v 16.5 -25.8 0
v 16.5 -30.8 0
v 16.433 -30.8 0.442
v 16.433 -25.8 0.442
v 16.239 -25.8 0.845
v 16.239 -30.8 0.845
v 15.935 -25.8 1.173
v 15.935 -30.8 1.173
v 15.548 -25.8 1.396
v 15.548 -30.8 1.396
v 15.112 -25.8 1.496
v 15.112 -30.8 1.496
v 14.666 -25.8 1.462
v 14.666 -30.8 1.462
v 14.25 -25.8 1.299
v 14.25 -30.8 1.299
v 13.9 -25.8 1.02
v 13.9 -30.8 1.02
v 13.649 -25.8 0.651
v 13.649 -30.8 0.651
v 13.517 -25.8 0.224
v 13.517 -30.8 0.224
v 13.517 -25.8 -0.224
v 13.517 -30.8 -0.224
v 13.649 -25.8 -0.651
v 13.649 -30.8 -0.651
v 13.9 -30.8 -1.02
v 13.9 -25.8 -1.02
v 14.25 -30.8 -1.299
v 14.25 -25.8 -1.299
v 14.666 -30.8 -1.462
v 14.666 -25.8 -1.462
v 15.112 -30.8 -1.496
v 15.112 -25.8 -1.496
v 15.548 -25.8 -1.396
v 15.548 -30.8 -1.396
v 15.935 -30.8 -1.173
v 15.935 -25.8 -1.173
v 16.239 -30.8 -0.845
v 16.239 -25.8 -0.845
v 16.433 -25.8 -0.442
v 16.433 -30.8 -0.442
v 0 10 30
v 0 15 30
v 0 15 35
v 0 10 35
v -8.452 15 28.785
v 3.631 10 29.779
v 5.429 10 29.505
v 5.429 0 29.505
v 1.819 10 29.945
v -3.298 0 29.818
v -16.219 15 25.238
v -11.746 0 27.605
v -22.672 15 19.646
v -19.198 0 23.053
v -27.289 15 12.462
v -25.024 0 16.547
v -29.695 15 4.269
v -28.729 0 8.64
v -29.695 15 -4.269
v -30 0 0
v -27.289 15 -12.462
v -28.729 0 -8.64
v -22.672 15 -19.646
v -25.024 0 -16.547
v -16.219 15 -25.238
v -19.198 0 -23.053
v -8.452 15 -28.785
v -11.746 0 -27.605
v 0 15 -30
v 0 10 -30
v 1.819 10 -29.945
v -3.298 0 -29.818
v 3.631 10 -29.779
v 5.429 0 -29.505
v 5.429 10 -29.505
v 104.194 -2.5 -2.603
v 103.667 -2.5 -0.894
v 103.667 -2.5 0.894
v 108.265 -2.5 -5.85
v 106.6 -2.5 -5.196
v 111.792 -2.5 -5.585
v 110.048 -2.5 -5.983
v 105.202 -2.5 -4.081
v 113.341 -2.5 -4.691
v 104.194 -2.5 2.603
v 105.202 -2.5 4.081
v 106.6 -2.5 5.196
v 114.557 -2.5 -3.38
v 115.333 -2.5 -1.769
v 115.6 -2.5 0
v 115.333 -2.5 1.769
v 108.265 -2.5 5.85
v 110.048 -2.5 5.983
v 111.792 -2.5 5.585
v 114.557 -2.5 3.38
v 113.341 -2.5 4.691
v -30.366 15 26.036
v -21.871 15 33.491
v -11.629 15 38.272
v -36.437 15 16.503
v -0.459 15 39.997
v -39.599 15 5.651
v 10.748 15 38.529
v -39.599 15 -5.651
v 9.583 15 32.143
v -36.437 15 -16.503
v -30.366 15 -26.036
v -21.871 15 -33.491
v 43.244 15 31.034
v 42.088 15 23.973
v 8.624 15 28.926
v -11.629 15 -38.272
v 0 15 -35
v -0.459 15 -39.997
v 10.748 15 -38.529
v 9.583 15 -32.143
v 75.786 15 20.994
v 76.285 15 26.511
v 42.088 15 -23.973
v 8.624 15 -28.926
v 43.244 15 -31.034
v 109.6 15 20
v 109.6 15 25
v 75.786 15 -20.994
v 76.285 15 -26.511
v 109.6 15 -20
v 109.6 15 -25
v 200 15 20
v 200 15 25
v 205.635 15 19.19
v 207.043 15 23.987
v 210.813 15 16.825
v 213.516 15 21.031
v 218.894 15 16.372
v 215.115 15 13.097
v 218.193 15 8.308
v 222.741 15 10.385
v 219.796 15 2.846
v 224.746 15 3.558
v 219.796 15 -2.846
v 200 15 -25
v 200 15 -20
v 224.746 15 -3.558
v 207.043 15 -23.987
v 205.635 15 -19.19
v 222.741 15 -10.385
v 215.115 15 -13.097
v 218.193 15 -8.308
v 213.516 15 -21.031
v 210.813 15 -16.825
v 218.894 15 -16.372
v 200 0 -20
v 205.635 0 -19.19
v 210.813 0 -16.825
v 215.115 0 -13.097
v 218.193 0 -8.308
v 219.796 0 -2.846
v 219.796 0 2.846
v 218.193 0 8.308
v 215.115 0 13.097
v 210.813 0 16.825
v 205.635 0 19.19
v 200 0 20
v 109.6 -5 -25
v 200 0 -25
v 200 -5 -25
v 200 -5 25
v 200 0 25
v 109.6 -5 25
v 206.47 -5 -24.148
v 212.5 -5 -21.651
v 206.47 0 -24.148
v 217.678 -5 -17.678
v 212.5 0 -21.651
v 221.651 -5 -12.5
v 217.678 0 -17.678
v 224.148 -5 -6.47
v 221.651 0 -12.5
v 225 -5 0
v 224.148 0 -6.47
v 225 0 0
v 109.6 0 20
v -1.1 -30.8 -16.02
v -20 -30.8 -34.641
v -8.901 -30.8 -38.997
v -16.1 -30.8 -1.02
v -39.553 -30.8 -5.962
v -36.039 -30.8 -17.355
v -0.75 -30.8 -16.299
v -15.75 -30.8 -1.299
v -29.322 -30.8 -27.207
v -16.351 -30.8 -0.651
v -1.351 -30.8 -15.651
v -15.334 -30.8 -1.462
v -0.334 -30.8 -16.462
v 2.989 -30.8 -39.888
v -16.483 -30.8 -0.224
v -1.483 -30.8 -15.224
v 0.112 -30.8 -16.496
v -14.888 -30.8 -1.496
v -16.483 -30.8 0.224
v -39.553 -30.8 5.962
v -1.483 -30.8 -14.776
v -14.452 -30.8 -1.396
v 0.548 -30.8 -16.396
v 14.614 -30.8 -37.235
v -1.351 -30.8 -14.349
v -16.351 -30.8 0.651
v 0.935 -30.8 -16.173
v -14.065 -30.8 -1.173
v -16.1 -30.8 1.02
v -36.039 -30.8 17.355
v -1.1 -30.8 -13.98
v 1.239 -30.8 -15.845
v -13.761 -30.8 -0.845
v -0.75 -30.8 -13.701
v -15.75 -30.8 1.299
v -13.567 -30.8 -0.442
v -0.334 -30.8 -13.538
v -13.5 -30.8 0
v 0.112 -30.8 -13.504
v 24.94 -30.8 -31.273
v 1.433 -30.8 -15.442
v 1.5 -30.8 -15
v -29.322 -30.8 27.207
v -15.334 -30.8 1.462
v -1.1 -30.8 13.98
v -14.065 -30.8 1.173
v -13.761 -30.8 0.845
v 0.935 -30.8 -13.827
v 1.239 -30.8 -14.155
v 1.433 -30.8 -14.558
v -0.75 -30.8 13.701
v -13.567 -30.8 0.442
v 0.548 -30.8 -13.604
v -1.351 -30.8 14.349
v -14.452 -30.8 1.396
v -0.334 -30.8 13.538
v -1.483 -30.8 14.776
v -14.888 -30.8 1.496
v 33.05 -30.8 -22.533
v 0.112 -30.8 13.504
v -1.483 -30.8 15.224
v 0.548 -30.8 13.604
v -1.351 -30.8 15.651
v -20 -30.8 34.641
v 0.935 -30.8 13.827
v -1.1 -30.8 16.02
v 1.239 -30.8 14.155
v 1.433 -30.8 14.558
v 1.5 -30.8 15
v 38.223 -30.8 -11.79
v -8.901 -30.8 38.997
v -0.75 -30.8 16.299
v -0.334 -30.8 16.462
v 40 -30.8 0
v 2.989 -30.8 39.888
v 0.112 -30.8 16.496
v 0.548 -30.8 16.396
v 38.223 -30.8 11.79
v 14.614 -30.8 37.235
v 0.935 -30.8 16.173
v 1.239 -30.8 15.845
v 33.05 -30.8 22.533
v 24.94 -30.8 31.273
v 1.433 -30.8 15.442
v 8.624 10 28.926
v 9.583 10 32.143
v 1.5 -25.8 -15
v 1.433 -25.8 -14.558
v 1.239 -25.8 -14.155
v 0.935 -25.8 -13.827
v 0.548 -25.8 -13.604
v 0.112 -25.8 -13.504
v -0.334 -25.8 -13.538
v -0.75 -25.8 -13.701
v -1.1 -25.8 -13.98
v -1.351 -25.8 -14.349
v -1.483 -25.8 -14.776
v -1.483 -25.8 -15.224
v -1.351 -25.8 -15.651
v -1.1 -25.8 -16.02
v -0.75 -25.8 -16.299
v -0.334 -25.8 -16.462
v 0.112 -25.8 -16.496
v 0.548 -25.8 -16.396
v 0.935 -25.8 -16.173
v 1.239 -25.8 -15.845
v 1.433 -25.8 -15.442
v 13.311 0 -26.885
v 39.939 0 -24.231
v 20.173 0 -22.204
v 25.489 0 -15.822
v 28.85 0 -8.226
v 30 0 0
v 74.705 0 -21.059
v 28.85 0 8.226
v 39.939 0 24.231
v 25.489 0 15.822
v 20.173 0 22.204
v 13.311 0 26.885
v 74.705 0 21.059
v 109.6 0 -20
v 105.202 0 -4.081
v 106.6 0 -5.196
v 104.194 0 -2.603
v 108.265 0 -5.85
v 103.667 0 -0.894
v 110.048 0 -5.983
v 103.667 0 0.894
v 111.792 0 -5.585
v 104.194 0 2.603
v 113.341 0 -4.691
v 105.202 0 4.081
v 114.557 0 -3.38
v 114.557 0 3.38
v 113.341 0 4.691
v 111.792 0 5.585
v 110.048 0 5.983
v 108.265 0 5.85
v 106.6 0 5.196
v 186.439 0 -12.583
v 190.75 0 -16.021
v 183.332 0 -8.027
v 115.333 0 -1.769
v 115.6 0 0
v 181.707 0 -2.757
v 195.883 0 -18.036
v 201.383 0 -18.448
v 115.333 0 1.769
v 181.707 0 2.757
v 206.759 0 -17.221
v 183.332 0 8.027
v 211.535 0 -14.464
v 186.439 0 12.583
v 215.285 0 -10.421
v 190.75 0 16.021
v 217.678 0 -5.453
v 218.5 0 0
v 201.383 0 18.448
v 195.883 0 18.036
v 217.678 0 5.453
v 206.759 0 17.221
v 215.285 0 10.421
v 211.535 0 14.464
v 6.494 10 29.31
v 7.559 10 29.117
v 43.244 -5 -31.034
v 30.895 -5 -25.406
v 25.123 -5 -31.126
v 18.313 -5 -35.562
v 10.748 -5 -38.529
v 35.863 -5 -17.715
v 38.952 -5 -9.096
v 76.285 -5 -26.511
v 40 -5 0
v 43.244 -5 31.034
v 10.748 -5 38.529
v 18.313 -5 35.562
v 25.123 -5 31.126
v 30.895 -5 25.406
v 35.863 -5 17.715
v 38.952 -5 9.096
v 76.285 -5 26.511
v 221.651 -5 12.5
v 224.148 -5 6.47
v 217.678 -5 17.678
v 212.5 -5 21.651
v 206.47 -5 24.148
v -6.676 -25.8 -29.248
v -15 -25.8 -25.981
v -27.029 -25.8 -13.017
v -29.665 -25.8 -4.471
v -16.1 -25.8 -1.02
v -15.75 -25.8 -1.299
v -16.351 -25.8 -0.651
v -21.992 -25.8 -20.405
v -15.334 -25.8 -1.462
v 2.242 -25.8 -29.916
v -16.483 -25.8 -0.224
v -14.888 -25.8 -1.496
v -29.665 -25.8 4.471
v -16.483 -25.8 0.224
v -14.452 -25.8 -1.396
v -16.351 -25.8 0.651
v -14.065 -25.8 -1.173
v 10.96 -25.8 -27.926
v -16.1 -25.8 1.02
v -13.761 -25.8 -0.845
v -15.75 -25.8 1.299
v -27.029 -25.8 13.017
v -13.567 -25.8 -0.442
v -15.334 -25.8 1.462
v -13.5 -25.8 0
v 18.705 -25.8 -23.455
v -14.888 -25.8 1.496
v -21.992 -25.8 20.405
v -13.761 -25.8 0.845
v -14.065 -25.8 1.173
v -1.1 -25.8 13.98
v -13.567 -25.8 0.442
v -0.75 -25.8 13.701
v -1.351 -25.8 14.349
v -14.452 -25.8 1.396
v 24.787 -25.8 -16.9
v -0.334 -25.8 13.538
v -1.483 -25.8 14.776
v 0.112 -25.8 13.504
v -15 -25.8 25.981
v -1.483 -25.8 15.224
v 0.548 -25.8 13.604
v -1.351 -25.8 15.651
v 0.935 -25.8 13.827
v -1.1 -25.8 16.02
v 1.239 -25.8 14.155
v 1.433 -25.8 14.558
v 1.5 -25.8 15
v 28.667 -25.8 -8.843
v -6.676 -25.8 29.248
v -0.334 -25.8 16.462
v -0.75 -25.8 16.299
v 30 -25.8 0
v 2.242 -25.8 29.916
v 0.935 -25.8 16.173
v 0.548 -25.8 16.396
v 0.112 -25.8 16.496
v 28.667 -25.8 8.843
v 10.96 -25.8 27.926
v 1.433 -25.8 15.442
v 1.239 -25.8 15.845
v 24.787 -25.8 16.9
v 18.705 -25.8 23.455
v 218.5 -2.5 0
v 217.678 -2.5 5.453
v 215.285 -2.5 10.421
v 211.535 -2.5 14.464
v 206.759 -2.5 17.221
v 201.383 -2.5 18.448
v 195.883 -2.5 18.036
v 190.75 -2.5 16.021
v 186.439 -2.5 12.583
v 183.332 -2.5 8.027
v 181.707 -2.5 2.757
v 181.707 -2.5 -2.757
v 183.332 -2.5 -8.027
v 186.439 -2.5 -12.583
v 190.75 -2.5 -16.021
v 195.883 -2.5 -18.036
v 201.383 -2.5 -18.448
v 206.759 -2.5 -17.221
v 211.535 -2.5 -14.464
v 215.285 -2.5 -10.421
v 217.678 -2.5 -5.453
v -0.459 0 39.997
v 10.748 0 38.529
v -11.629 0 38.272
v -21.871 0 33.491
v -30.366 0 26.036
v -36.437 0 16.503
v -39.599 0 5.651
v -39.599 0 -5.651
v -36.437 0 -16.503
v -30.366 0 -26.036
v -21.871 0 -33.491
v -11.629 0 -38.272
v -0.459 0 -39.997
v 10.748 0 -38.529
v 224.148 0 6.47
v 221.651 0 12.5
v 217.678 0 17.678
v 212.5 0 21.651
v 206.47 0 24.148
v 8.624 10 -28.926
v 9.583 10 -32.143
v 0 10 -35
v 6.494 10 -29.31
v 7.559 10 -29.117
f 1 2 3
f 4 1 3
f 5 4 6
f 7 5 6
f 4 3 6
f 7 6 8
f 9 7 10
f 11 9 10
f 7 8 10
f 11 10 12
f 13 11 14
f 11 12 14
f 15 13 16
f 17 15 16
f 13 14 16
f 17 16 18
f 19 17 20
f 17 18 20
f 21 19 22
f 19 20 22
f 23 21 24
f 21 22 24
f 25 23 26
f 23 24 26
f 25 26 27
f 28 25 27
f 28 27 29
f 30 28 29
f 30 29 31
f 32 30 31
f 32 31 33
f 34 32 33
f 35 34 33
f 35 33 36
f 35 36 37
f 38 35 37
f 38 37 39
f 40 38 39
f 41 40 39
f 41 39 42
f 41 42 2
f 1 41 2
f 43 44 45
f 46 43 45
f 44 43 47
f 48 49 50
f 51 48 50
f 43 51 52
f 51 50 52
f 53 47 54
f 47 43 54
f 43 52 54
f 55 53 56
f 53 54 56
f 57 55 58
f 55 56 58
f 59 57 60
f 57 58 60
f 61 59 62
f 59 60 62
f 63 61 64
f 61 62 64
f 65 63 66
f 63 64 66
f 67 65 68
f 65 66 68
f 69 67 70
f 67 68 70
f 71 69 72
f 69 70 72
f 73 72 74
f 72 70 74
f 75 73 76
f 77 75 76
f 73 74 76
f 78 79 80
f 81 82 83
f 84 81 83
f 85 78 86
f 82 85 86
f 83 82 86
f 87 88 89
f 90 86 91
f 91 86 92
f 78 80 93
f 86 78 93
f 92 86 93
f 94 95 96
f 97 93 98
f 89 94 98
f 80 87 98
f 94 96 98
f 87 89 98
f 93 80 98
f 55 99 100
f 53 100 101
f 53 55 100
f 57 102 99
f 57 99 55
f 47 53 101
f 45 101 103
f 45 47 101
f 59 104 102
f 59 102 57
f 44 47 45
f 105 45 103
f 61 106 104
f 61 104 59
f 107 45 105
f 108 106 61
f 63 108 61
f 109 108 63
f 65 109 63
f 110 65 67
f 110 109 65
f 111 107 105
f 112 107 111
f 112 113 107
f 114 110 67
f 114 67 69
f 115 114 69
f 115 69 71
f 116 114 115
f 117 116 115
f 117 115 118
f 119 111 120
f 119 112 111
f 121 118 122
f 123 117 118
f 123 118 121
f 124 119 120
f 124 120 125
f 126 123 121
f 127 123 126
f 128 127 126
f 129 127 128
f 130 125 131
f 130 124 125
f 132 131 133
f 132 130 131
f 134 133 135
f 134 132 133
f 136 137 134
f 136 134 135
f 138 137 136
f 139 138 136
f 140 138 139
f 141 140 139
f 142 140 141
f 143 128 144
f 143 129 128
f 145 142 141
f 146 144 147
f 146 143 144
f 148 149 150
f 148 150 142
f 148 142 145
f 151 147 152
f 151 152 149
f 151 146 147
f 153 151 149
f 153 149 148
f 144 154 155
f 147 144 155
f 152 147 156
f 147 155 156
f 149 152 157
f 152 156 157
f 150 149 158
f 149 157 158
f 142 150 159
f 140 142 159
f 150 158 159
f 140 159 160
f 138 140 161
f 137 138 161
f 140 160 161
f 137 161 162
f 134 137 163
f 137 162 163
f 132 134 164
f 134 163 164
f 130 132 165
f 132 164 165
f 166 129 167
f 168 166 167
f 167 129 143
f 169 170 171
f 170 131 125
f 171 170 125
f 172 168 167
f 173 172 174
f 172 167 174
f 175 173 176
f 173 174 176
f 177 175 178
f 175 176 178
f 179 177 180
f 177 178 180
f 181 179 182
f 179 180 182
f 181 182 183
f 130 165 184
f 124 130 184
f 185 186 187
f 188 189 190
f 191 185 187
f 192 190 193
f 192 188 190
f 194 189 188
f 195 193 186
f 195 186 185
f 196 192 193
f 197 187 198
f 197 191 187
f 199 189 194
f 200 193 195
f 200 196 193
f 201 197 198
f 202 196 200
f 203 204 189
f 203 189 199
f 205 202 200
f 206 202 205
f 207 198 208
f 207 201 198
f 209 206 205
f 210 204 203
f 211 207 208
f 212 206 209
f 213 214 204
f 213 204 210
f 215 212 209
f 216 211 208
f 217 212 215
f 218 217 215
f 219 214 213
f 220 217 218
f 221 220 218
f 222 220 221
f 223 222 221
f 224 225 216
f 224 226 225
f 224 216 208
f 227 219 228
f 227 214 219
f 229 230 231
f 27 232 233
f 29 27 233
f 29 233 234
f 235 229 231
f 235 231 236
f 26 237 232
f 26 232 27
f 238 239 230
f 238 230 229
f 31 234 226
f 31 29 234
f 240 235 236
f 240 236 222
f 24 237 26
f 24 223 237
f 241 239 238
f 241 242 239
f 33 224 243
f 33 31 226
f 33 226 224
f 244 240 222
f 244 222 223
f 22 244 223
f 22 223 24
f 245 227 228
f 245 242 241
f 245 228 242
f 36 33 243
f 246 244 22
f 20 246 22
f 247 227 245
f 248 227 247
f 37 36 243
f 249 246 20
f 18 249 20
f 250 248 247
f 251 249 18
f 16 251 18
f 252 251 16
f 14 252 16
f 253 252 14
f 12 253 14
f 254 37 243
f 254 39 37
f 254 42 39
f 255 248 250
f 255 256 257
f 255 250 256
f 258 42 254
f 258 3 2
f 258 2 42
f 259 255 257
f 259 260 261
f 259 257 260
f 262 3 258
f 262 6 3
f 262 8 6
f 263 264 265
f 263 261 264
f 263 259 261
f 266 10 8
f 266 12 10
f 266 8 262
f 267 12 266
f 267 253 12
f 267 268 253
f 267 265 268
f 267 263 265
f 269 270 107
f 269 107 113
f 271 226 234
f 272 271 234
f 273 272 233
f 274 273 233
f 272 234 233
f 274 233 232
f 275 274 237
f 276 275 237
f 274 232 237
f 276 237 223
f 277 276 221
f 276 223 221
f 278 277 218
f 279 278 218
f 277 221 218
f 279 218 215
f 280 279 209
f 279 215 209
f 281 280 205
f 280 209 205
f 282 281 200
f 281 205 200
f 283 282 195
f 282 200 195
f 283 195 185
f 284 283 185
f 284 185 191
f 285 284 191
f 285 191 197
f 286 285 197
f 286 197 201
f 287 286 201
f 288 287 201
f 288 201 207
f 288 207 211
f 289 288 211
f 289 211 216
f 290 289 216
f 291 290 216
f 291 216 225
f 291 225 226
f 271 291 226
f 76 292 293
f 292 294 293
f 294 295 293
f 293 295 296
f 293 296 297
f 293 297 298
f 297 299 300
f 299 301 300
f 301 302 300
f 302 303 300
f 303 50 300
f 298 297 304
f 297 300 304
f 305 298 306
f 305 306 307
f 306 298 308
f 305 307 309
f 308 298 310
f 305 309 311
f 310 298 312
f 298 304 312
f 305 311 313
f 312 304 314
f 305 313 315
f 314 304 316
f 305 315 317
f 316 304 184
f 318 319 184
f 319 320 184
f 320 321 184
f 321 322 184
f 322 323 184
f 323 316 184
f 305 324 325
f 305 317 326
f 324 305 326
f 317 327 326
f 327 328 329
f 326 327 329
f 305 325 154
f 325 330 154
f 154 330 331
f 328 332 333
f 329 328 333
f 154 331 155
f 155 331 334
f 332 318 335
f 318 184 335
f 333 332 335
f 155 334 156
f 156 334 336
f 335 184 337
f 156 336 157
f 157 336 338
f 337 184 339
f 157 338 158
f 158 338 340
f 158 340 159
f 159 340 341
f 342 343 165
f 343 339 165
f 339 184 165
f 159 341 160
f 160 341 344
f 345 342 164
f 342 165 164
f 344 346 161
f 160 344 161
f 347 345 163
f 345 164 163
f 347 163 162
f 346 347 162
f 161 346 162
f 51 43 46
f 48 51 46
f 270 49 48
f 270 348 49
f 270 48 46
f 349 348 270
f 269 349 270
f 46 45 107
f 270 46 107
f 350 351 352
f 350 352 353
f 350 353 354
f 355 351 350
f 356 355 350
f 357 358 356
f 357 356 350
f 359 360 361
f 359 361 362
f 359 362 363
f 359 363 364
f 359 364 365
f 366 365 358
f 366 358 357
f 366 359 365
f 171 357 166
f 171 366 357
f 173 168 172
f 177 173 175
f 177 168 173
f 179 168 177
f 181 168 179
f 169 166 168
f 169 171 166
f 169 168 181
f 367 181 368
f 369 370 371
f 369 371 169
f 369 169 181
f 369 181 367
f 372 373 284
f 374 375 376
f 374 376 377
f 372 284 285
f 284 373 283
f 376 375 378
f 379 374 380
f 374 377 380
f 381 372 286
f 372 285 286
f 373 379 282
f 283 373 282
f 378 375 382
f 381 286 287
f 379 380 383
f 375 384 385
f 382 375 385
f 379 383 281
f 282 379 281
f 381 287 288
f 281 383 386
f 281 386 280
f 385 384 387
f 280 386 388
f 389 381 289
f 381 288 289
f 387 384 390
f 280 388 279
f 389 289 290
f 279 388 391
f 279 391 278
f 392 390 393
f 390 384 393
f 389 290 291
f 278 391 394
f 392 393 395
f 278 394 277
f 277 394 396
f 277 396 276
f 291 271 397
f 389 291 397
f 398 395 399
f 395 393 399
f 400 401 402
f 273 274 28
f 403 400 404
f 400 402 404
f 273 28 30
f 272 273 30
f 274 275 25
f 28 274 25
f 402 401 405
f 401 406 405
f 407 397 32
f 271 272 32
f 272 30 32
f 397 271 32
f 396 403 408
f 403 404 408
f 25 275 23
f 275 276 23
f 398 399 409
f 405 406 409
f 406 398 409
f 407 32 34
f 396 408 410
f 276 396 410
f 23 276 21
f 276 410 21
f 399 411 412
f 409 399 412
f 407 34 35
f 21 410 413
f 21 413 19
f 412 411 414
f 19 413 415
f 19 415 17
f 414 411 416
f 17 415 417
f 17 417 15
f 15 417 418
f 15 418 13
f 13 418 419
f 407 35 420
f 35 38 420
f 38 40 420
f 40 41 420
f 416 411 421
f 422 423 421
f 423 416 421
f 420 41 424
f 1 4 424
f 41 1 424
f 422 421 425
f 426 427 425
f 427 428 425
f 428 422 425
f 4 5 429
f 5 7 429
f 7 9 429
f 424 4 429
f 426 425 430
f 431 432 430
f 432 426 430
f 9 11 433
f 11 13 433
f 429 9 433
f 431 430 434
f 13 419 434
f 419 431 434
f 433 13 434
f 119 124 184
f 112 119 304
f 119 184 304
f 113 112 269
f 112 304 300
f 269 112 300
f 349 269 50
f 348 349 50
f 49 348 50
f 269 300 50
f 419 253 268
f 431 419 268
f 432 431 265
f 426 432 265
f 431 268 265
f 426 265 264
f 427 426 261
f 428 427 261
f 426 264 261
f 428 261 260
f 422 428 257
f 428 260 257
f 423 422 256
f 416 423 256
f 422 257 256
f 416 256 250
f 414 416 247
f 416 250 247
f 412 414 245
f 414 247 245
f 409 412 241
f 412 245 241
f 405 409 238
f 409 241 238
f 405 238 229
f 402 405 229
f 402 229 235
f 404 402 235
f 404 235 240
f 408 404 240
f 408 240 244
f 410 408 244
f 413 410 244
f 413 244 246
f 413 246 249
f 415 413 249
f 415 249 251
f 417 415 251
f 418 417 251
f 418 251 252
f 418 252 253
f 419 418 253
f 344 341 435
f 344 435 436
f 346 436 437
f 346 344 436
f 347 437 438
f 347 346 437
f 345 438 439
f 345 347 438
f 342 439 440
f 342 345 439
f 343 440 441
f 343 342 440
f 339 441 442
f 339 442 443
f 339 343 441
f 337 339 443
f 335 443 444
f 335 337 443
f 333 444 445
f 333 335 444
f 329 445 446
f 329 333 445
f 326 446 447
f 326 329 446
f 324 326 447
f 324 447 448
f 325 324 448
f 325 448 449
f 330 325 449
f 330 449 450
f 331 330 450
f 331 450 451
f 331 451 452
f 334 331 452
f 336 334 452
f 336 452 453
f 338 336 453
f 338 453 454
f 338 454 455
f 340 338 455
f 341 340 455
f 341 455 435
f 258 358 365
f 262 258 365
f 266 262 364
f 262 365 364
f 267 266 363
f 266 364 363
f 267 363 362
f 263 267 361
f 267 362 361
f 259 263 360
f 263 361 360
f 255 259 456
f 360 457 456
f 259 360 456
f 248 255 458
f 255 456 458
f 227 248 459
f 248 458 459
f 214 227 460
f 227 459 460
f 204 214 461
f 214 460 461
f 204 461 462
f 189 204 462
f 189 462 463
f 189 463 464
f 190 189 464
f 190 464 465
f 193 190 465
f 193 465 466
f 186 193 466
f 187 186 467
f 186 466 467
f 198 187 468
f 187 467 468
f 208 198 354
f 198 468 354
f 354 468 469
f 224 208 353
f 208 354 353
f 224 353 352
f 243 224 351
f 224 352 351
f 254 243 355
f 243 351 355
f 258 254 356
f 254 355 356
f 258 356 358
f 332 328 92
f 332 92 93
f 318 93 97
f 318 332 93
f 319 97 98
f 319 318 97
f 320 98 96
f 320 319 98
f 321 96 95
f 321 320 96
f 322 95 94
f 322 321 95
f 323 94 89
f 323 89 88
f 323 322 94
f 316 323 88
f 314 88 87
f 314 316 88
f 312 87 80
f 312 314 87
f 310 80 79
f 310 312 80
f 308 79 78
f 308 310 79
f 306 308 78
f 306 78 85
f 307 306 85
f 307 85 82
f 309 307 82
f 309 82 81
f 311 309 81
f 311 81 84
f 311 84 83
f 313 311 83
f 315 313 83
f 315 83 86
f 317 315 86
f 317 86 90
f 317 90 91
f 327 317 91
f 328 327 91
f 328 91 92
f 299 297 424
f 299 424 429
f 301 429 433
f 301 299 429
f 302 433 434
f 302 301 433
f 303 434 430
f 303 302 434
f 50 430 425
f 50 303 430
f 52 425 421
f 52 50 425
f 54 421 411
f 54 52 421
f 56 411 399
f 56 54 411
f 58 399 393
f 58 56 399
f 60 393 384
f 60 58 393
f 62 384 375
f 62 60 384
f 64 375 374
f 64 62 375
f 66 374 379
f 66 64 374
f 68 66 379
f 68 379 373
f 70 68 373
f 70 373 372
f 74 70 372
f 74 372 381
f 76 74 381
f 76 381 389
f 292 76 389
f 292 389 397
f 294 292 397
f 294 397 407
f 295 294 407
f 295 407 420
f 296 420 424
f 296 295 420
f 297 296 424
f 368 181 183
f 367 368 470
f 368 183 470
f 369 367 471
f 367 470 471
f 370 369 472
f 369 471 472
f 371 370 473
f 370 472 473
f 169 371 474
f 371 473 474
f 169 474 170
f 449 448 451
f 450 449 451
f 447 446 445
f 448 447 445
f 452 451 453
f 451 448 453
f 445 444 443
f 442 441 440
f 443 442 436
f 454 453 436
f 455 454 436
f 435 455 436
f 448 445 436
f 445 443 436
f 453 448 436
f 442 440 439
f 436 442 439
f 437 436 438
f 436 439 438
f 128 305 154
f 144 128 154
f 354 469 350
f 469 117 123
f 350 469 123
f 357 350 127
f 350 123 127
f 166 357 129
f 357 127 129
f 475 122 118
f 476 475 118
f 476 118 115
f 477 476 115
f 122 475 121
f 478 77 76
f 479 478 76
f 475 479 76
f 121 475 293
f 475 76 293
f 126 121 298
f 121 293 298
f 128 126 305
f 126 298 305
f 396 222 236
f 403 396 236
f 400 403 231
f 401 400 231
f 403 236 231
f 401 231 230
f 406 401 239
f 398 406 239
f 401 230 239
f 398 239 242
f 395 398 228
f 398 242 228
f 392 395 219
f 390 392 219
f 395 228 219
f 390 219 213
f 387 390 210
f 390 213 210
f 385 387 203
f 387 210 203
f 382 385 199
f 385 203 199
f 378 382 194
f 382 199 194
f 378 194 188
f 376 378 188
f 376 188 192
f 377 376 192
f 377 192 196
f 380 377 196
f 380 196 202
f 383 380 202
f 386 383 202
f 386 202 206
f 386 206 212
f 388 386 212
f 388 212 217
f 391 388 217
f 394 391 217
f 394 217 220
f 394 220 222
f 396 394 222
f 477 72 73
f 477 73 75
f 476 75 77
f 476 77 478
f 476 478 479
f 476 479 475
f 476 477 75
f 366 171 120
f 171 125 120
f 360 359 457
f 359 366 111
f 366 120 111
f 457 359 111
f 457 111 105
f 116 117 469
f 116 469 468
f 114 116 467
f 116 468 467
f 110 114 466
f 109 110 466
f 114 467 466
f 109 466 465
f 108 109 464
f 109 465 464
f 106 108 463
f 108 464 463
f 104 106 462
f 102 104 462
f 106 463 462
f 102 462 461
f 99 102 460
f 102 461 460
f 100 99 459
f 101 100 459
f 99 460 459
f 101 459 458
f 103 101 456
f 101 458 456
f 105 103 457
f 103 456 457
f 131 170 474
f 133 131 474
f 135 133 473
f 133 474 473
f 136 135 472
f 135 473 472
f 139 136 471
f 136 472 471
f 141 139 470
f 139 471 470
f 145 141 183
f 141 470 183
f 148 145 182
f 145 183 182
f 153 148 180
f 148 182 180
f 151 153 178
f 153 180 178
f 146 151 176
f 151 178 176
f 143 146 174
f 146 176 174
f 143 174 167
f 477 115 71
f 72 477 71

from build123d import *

# Parameters (mm, degrees)
BOSS_EXTRUDE1_DEPTH     = 15
SKETCH2_R               = 40
SKETCH2_R_2             = 30
BOSS_EXTRUDE2_DEPTH     = 25.8
SKETCH3_R               = 40
BOSS_EXTRUDE3_DEPTH     = 5
SKETCH4_R               = 6
SKETCH4_R_2             = 18.5
BOSS_EXTRUDE4_DEPTH     = 5
SKETCH6_R               = 6
SKETCH6_R_2             = 18.5
BOSS_EXTRUDE5_DEPTH     = 2.5
CUT_EXTRUDE1_DEPTH      = 5
SKETCH8_R               = 1.5
CUT_EXTRUDE2_DEPTH      = 1
CUT_EXTRUDE2_DEPTH_BACK = 46.8


with BuildPart() as part:
    # Sketch1 → Boss-Extrude1 (new body)
    with BuildSketch(Plane(origin=(0, 0, 0), x_dir=(1, 0, 0), z_dir=(0, 1, 0))):
        with BuildLine():
            ThreePointArc((200, -25), (225, 0), (200, 25))
            Line((200, 25), (109.6, 25))
            ThreePointArc((109.6, 25), (59.713041879, 28.397959328), (10.747591761, 38.529070471))
            ThreePointArc((10.747591761, 38.529070471), (-40, 0), (10.747591761, -38.529070471))
            ThreePointArc((10.747591761, -38.529070471), (59.713041879, -28.397959328), (109.6, -25))
            Line((109.6, -25), (200, -25))
        make_face()
        with BuildLine():
            Line((109.6, 20), (200, 20))
            ThreePointArc((200, 20), (220, 0), (200, -20))
            Line((200, -20), (109.6, -20))
            ThreePointArc((109.6, -20), (57.298273937, -22.381082353), (5.429254567, -29.504630058))
            ThreePointArc((5.429254567, -29.504630058), (-30, 0), (5.429254567, 29.504630058))
            ThreePointArc((5.429254567, 29.504630058), (57.298273937, 22.381082353), (109.6, 20))
        make_face(mode=Mode.SUBTRACT)
    extrude(amount=BOSS_EXTRUDE1_DEPTH)

    # Sketch2 → Boss-Extrude2 (add)
    with BuildSketch(Plane.XZ):
        Circle(SKETCH2_R)
        Circle(SKETCH2_R_2, mode=Mode.SUBTRACT)
    extrude(amount=BOSS_EXTRUDE2_DEPTH)

    # Sketch3 → Boss-Extrude3 (add)
    with BuildSketch(Plane.XZ.offset(25.8)):
        Circle(SKETCH3_R)
    extrude(amount=BOSS_EXTRUDE3_DEPTH)

    # Sketch4 → Boss-Extrude4 (add)
    with BuildSketch(Plane.XZ):
        with BuildLine():
            ThreePointArc((185, -20), (175, 0), (185, 20))
            Line((185, 20), (109.6, 20))
            ThreePointArc((109.6, 20), (70.154992453, 21.353125364), (30.895437645, 25.406139666))
            ThreePointArc((30.895437645, 25.406139666), (37.655129171, 13.494118982), (40, 0))
            ThreePointArc((40, 0), (37.655129171, -13.494118982), (30.895437645, -25.406139666))
            ThreePointArc((30.895437645, -25.406139666), (70.154992453, -21.353125364), (109.6, -20))
            Line((109.6, -20), (185, -20))
        make_face()
        with Locations((109.6, 0)):
            Circle(SKETCH4_R, mode=Mode.SUBTRACT)
        with BuildLine():
            Line((200, 20), (185, 20))
            ThreePointArc((185, 20), (175, 0), (185, -20))
            Line((185, -20), (200, -20))
            ThreePointArc((200, -20), (220, 0), (200, 20))
        make_face()
        with Locations((200, 0)):
            Circle(SKETCH4_R_2, mode=Mode.SUBTRACT)
        with BuildLine():
            ThreePointArc((225, 0), (217.67766953, 17.67766953), (200, 25))
            ThreePointArc((200, 25), (192.09430585, 23.717082451), (185, 20))
            Line((185, 20), (200, 20))
            ThreePointArc((200, 20), (220, 0), (200, -20))
            Line((200, -20), (185, -20))
            ThreePointArc((185, -20), (192.09430585, -23.717082451), (200, -25))
            ThreePointArc((200, -25), (217.67766953, -17.67766953), (225, 0))
        make_face()
        with BuildLine():
            ThreePointArc((185, 20), (192.09430585, 23.717082451), (200, 25))
            Line((200, 25), (109.6, 25))
            ThreePointArc((109.6, 25), (59.713041879, 28.397959328), (10.747591761, 38.529070471))
            ThreePointArc((10.747591761, 38.529070471), (21.830902473, 33.51733428), (30.895437645, 25.406139666))
            ThreePointArc((30.895437645, 25.406139666), (70.154992453, 21.353125364), (109.6, 20))
            Line((109.6, 20), (185, 20))
        make_face()
        with BuildLine():
            Line((109.6, -25), (200, -25))
            ThreePointArc((200, -25), (192.09430585, -23.717082451), (185, -20))
            Line((185, -20), (109.6, -20))
            ThreePointArc((109.6, -20), (70.154992453, -21.353125364), (30.895437645, -25.406139666))
            ThreePointArc((30.895437645, -25.406139666), (21.830902473, -33.51733428), (10.747591761, -38.529070471))
            ThreePointArc((10.747591761, -38.529070471), (59.713041879, -28.397959328), (109.6, -25))
        make_face()
    extrude(amount=BOSS_EXTRUDE4_DEPTH)

    # Sketch6 → Boss-Extrude5 (add)
    with BuildSketch(Plane.XZ.offset(5)):
        with Locations((109.6, 0)):
            Circle(SKETCH6_R)
        with Locations((200, 0)):
            Circle(SKETCH6_R_2)
    extrude(amount=-BOSS_EXTRUDE5_DEPTH)

    # Sketch7 → Cut-Extrude1 (cut)
    with BuildSketch(Plane(origin=(0, 15, 0), x_dir=(1, 0, 0), z_dir=(0, 1, 0))):
        with BuildLine():
            ThreePointArc((5.429254567, -29.504630058), (2.725903361, -29.875900838), (0, -30))
            Line((0, -30), (0, -35))
            Line((0, -35), (9.583148475, -32.142857143))
            Line((9.583148475, -32.142857143), (8.624081591, -28.926049021))
            ThreePointArc((8.624081591, -28.926049021), (7.026260133, -29.213086928), (5.429254567, -29.504630058))
        make_face()
        with BuildLine():
            Line((0, 35), (0, 30))
            ThreePointArc((0, 30), (2.725903361, 29.875900838), (5.429254567, 29.504630058))
            ThreePointArc((5.429254567, 29.504630058), (7.026260133, 29.213086928), (8.624081591, 28.926049021))
            Line((8.624081591, 28.926049021), (9.583148475, 32.142857143))
            Line((9.583148475, 32.142857143), (0, 35))
        make_face()
    extrude(amount=-CUT_EXTRUDE1_DEPTH, mode=Mode.SUBTRACT)

    # Sketch8 → Cut-Extrude2 (cut, two sides)
    with BuildSketch(Plane.XZ.offset(30.8)) as cut_extrude2_sk:
        with Locations((0, 15)):
            Circle(SKETCH8_R)
        with Locations((15, 0)):
            Circle(SKETCH8_R)
        with Locations((0, -15)):
            Circle(SKETCH8_R)
        with Locations((-15, 0)):
            Circle(SKETCH8_R)
    extrude(amount=CUT_EXTRUDE2_DEPTH, mode=Mode.SUBTRACT)
    extrude(cut_extrude2_sk.sketch, amount=-CUT_EXTRUDE2_DEPTH_BACK, mode=Mode.SUBTRACT)


solid = part.part
